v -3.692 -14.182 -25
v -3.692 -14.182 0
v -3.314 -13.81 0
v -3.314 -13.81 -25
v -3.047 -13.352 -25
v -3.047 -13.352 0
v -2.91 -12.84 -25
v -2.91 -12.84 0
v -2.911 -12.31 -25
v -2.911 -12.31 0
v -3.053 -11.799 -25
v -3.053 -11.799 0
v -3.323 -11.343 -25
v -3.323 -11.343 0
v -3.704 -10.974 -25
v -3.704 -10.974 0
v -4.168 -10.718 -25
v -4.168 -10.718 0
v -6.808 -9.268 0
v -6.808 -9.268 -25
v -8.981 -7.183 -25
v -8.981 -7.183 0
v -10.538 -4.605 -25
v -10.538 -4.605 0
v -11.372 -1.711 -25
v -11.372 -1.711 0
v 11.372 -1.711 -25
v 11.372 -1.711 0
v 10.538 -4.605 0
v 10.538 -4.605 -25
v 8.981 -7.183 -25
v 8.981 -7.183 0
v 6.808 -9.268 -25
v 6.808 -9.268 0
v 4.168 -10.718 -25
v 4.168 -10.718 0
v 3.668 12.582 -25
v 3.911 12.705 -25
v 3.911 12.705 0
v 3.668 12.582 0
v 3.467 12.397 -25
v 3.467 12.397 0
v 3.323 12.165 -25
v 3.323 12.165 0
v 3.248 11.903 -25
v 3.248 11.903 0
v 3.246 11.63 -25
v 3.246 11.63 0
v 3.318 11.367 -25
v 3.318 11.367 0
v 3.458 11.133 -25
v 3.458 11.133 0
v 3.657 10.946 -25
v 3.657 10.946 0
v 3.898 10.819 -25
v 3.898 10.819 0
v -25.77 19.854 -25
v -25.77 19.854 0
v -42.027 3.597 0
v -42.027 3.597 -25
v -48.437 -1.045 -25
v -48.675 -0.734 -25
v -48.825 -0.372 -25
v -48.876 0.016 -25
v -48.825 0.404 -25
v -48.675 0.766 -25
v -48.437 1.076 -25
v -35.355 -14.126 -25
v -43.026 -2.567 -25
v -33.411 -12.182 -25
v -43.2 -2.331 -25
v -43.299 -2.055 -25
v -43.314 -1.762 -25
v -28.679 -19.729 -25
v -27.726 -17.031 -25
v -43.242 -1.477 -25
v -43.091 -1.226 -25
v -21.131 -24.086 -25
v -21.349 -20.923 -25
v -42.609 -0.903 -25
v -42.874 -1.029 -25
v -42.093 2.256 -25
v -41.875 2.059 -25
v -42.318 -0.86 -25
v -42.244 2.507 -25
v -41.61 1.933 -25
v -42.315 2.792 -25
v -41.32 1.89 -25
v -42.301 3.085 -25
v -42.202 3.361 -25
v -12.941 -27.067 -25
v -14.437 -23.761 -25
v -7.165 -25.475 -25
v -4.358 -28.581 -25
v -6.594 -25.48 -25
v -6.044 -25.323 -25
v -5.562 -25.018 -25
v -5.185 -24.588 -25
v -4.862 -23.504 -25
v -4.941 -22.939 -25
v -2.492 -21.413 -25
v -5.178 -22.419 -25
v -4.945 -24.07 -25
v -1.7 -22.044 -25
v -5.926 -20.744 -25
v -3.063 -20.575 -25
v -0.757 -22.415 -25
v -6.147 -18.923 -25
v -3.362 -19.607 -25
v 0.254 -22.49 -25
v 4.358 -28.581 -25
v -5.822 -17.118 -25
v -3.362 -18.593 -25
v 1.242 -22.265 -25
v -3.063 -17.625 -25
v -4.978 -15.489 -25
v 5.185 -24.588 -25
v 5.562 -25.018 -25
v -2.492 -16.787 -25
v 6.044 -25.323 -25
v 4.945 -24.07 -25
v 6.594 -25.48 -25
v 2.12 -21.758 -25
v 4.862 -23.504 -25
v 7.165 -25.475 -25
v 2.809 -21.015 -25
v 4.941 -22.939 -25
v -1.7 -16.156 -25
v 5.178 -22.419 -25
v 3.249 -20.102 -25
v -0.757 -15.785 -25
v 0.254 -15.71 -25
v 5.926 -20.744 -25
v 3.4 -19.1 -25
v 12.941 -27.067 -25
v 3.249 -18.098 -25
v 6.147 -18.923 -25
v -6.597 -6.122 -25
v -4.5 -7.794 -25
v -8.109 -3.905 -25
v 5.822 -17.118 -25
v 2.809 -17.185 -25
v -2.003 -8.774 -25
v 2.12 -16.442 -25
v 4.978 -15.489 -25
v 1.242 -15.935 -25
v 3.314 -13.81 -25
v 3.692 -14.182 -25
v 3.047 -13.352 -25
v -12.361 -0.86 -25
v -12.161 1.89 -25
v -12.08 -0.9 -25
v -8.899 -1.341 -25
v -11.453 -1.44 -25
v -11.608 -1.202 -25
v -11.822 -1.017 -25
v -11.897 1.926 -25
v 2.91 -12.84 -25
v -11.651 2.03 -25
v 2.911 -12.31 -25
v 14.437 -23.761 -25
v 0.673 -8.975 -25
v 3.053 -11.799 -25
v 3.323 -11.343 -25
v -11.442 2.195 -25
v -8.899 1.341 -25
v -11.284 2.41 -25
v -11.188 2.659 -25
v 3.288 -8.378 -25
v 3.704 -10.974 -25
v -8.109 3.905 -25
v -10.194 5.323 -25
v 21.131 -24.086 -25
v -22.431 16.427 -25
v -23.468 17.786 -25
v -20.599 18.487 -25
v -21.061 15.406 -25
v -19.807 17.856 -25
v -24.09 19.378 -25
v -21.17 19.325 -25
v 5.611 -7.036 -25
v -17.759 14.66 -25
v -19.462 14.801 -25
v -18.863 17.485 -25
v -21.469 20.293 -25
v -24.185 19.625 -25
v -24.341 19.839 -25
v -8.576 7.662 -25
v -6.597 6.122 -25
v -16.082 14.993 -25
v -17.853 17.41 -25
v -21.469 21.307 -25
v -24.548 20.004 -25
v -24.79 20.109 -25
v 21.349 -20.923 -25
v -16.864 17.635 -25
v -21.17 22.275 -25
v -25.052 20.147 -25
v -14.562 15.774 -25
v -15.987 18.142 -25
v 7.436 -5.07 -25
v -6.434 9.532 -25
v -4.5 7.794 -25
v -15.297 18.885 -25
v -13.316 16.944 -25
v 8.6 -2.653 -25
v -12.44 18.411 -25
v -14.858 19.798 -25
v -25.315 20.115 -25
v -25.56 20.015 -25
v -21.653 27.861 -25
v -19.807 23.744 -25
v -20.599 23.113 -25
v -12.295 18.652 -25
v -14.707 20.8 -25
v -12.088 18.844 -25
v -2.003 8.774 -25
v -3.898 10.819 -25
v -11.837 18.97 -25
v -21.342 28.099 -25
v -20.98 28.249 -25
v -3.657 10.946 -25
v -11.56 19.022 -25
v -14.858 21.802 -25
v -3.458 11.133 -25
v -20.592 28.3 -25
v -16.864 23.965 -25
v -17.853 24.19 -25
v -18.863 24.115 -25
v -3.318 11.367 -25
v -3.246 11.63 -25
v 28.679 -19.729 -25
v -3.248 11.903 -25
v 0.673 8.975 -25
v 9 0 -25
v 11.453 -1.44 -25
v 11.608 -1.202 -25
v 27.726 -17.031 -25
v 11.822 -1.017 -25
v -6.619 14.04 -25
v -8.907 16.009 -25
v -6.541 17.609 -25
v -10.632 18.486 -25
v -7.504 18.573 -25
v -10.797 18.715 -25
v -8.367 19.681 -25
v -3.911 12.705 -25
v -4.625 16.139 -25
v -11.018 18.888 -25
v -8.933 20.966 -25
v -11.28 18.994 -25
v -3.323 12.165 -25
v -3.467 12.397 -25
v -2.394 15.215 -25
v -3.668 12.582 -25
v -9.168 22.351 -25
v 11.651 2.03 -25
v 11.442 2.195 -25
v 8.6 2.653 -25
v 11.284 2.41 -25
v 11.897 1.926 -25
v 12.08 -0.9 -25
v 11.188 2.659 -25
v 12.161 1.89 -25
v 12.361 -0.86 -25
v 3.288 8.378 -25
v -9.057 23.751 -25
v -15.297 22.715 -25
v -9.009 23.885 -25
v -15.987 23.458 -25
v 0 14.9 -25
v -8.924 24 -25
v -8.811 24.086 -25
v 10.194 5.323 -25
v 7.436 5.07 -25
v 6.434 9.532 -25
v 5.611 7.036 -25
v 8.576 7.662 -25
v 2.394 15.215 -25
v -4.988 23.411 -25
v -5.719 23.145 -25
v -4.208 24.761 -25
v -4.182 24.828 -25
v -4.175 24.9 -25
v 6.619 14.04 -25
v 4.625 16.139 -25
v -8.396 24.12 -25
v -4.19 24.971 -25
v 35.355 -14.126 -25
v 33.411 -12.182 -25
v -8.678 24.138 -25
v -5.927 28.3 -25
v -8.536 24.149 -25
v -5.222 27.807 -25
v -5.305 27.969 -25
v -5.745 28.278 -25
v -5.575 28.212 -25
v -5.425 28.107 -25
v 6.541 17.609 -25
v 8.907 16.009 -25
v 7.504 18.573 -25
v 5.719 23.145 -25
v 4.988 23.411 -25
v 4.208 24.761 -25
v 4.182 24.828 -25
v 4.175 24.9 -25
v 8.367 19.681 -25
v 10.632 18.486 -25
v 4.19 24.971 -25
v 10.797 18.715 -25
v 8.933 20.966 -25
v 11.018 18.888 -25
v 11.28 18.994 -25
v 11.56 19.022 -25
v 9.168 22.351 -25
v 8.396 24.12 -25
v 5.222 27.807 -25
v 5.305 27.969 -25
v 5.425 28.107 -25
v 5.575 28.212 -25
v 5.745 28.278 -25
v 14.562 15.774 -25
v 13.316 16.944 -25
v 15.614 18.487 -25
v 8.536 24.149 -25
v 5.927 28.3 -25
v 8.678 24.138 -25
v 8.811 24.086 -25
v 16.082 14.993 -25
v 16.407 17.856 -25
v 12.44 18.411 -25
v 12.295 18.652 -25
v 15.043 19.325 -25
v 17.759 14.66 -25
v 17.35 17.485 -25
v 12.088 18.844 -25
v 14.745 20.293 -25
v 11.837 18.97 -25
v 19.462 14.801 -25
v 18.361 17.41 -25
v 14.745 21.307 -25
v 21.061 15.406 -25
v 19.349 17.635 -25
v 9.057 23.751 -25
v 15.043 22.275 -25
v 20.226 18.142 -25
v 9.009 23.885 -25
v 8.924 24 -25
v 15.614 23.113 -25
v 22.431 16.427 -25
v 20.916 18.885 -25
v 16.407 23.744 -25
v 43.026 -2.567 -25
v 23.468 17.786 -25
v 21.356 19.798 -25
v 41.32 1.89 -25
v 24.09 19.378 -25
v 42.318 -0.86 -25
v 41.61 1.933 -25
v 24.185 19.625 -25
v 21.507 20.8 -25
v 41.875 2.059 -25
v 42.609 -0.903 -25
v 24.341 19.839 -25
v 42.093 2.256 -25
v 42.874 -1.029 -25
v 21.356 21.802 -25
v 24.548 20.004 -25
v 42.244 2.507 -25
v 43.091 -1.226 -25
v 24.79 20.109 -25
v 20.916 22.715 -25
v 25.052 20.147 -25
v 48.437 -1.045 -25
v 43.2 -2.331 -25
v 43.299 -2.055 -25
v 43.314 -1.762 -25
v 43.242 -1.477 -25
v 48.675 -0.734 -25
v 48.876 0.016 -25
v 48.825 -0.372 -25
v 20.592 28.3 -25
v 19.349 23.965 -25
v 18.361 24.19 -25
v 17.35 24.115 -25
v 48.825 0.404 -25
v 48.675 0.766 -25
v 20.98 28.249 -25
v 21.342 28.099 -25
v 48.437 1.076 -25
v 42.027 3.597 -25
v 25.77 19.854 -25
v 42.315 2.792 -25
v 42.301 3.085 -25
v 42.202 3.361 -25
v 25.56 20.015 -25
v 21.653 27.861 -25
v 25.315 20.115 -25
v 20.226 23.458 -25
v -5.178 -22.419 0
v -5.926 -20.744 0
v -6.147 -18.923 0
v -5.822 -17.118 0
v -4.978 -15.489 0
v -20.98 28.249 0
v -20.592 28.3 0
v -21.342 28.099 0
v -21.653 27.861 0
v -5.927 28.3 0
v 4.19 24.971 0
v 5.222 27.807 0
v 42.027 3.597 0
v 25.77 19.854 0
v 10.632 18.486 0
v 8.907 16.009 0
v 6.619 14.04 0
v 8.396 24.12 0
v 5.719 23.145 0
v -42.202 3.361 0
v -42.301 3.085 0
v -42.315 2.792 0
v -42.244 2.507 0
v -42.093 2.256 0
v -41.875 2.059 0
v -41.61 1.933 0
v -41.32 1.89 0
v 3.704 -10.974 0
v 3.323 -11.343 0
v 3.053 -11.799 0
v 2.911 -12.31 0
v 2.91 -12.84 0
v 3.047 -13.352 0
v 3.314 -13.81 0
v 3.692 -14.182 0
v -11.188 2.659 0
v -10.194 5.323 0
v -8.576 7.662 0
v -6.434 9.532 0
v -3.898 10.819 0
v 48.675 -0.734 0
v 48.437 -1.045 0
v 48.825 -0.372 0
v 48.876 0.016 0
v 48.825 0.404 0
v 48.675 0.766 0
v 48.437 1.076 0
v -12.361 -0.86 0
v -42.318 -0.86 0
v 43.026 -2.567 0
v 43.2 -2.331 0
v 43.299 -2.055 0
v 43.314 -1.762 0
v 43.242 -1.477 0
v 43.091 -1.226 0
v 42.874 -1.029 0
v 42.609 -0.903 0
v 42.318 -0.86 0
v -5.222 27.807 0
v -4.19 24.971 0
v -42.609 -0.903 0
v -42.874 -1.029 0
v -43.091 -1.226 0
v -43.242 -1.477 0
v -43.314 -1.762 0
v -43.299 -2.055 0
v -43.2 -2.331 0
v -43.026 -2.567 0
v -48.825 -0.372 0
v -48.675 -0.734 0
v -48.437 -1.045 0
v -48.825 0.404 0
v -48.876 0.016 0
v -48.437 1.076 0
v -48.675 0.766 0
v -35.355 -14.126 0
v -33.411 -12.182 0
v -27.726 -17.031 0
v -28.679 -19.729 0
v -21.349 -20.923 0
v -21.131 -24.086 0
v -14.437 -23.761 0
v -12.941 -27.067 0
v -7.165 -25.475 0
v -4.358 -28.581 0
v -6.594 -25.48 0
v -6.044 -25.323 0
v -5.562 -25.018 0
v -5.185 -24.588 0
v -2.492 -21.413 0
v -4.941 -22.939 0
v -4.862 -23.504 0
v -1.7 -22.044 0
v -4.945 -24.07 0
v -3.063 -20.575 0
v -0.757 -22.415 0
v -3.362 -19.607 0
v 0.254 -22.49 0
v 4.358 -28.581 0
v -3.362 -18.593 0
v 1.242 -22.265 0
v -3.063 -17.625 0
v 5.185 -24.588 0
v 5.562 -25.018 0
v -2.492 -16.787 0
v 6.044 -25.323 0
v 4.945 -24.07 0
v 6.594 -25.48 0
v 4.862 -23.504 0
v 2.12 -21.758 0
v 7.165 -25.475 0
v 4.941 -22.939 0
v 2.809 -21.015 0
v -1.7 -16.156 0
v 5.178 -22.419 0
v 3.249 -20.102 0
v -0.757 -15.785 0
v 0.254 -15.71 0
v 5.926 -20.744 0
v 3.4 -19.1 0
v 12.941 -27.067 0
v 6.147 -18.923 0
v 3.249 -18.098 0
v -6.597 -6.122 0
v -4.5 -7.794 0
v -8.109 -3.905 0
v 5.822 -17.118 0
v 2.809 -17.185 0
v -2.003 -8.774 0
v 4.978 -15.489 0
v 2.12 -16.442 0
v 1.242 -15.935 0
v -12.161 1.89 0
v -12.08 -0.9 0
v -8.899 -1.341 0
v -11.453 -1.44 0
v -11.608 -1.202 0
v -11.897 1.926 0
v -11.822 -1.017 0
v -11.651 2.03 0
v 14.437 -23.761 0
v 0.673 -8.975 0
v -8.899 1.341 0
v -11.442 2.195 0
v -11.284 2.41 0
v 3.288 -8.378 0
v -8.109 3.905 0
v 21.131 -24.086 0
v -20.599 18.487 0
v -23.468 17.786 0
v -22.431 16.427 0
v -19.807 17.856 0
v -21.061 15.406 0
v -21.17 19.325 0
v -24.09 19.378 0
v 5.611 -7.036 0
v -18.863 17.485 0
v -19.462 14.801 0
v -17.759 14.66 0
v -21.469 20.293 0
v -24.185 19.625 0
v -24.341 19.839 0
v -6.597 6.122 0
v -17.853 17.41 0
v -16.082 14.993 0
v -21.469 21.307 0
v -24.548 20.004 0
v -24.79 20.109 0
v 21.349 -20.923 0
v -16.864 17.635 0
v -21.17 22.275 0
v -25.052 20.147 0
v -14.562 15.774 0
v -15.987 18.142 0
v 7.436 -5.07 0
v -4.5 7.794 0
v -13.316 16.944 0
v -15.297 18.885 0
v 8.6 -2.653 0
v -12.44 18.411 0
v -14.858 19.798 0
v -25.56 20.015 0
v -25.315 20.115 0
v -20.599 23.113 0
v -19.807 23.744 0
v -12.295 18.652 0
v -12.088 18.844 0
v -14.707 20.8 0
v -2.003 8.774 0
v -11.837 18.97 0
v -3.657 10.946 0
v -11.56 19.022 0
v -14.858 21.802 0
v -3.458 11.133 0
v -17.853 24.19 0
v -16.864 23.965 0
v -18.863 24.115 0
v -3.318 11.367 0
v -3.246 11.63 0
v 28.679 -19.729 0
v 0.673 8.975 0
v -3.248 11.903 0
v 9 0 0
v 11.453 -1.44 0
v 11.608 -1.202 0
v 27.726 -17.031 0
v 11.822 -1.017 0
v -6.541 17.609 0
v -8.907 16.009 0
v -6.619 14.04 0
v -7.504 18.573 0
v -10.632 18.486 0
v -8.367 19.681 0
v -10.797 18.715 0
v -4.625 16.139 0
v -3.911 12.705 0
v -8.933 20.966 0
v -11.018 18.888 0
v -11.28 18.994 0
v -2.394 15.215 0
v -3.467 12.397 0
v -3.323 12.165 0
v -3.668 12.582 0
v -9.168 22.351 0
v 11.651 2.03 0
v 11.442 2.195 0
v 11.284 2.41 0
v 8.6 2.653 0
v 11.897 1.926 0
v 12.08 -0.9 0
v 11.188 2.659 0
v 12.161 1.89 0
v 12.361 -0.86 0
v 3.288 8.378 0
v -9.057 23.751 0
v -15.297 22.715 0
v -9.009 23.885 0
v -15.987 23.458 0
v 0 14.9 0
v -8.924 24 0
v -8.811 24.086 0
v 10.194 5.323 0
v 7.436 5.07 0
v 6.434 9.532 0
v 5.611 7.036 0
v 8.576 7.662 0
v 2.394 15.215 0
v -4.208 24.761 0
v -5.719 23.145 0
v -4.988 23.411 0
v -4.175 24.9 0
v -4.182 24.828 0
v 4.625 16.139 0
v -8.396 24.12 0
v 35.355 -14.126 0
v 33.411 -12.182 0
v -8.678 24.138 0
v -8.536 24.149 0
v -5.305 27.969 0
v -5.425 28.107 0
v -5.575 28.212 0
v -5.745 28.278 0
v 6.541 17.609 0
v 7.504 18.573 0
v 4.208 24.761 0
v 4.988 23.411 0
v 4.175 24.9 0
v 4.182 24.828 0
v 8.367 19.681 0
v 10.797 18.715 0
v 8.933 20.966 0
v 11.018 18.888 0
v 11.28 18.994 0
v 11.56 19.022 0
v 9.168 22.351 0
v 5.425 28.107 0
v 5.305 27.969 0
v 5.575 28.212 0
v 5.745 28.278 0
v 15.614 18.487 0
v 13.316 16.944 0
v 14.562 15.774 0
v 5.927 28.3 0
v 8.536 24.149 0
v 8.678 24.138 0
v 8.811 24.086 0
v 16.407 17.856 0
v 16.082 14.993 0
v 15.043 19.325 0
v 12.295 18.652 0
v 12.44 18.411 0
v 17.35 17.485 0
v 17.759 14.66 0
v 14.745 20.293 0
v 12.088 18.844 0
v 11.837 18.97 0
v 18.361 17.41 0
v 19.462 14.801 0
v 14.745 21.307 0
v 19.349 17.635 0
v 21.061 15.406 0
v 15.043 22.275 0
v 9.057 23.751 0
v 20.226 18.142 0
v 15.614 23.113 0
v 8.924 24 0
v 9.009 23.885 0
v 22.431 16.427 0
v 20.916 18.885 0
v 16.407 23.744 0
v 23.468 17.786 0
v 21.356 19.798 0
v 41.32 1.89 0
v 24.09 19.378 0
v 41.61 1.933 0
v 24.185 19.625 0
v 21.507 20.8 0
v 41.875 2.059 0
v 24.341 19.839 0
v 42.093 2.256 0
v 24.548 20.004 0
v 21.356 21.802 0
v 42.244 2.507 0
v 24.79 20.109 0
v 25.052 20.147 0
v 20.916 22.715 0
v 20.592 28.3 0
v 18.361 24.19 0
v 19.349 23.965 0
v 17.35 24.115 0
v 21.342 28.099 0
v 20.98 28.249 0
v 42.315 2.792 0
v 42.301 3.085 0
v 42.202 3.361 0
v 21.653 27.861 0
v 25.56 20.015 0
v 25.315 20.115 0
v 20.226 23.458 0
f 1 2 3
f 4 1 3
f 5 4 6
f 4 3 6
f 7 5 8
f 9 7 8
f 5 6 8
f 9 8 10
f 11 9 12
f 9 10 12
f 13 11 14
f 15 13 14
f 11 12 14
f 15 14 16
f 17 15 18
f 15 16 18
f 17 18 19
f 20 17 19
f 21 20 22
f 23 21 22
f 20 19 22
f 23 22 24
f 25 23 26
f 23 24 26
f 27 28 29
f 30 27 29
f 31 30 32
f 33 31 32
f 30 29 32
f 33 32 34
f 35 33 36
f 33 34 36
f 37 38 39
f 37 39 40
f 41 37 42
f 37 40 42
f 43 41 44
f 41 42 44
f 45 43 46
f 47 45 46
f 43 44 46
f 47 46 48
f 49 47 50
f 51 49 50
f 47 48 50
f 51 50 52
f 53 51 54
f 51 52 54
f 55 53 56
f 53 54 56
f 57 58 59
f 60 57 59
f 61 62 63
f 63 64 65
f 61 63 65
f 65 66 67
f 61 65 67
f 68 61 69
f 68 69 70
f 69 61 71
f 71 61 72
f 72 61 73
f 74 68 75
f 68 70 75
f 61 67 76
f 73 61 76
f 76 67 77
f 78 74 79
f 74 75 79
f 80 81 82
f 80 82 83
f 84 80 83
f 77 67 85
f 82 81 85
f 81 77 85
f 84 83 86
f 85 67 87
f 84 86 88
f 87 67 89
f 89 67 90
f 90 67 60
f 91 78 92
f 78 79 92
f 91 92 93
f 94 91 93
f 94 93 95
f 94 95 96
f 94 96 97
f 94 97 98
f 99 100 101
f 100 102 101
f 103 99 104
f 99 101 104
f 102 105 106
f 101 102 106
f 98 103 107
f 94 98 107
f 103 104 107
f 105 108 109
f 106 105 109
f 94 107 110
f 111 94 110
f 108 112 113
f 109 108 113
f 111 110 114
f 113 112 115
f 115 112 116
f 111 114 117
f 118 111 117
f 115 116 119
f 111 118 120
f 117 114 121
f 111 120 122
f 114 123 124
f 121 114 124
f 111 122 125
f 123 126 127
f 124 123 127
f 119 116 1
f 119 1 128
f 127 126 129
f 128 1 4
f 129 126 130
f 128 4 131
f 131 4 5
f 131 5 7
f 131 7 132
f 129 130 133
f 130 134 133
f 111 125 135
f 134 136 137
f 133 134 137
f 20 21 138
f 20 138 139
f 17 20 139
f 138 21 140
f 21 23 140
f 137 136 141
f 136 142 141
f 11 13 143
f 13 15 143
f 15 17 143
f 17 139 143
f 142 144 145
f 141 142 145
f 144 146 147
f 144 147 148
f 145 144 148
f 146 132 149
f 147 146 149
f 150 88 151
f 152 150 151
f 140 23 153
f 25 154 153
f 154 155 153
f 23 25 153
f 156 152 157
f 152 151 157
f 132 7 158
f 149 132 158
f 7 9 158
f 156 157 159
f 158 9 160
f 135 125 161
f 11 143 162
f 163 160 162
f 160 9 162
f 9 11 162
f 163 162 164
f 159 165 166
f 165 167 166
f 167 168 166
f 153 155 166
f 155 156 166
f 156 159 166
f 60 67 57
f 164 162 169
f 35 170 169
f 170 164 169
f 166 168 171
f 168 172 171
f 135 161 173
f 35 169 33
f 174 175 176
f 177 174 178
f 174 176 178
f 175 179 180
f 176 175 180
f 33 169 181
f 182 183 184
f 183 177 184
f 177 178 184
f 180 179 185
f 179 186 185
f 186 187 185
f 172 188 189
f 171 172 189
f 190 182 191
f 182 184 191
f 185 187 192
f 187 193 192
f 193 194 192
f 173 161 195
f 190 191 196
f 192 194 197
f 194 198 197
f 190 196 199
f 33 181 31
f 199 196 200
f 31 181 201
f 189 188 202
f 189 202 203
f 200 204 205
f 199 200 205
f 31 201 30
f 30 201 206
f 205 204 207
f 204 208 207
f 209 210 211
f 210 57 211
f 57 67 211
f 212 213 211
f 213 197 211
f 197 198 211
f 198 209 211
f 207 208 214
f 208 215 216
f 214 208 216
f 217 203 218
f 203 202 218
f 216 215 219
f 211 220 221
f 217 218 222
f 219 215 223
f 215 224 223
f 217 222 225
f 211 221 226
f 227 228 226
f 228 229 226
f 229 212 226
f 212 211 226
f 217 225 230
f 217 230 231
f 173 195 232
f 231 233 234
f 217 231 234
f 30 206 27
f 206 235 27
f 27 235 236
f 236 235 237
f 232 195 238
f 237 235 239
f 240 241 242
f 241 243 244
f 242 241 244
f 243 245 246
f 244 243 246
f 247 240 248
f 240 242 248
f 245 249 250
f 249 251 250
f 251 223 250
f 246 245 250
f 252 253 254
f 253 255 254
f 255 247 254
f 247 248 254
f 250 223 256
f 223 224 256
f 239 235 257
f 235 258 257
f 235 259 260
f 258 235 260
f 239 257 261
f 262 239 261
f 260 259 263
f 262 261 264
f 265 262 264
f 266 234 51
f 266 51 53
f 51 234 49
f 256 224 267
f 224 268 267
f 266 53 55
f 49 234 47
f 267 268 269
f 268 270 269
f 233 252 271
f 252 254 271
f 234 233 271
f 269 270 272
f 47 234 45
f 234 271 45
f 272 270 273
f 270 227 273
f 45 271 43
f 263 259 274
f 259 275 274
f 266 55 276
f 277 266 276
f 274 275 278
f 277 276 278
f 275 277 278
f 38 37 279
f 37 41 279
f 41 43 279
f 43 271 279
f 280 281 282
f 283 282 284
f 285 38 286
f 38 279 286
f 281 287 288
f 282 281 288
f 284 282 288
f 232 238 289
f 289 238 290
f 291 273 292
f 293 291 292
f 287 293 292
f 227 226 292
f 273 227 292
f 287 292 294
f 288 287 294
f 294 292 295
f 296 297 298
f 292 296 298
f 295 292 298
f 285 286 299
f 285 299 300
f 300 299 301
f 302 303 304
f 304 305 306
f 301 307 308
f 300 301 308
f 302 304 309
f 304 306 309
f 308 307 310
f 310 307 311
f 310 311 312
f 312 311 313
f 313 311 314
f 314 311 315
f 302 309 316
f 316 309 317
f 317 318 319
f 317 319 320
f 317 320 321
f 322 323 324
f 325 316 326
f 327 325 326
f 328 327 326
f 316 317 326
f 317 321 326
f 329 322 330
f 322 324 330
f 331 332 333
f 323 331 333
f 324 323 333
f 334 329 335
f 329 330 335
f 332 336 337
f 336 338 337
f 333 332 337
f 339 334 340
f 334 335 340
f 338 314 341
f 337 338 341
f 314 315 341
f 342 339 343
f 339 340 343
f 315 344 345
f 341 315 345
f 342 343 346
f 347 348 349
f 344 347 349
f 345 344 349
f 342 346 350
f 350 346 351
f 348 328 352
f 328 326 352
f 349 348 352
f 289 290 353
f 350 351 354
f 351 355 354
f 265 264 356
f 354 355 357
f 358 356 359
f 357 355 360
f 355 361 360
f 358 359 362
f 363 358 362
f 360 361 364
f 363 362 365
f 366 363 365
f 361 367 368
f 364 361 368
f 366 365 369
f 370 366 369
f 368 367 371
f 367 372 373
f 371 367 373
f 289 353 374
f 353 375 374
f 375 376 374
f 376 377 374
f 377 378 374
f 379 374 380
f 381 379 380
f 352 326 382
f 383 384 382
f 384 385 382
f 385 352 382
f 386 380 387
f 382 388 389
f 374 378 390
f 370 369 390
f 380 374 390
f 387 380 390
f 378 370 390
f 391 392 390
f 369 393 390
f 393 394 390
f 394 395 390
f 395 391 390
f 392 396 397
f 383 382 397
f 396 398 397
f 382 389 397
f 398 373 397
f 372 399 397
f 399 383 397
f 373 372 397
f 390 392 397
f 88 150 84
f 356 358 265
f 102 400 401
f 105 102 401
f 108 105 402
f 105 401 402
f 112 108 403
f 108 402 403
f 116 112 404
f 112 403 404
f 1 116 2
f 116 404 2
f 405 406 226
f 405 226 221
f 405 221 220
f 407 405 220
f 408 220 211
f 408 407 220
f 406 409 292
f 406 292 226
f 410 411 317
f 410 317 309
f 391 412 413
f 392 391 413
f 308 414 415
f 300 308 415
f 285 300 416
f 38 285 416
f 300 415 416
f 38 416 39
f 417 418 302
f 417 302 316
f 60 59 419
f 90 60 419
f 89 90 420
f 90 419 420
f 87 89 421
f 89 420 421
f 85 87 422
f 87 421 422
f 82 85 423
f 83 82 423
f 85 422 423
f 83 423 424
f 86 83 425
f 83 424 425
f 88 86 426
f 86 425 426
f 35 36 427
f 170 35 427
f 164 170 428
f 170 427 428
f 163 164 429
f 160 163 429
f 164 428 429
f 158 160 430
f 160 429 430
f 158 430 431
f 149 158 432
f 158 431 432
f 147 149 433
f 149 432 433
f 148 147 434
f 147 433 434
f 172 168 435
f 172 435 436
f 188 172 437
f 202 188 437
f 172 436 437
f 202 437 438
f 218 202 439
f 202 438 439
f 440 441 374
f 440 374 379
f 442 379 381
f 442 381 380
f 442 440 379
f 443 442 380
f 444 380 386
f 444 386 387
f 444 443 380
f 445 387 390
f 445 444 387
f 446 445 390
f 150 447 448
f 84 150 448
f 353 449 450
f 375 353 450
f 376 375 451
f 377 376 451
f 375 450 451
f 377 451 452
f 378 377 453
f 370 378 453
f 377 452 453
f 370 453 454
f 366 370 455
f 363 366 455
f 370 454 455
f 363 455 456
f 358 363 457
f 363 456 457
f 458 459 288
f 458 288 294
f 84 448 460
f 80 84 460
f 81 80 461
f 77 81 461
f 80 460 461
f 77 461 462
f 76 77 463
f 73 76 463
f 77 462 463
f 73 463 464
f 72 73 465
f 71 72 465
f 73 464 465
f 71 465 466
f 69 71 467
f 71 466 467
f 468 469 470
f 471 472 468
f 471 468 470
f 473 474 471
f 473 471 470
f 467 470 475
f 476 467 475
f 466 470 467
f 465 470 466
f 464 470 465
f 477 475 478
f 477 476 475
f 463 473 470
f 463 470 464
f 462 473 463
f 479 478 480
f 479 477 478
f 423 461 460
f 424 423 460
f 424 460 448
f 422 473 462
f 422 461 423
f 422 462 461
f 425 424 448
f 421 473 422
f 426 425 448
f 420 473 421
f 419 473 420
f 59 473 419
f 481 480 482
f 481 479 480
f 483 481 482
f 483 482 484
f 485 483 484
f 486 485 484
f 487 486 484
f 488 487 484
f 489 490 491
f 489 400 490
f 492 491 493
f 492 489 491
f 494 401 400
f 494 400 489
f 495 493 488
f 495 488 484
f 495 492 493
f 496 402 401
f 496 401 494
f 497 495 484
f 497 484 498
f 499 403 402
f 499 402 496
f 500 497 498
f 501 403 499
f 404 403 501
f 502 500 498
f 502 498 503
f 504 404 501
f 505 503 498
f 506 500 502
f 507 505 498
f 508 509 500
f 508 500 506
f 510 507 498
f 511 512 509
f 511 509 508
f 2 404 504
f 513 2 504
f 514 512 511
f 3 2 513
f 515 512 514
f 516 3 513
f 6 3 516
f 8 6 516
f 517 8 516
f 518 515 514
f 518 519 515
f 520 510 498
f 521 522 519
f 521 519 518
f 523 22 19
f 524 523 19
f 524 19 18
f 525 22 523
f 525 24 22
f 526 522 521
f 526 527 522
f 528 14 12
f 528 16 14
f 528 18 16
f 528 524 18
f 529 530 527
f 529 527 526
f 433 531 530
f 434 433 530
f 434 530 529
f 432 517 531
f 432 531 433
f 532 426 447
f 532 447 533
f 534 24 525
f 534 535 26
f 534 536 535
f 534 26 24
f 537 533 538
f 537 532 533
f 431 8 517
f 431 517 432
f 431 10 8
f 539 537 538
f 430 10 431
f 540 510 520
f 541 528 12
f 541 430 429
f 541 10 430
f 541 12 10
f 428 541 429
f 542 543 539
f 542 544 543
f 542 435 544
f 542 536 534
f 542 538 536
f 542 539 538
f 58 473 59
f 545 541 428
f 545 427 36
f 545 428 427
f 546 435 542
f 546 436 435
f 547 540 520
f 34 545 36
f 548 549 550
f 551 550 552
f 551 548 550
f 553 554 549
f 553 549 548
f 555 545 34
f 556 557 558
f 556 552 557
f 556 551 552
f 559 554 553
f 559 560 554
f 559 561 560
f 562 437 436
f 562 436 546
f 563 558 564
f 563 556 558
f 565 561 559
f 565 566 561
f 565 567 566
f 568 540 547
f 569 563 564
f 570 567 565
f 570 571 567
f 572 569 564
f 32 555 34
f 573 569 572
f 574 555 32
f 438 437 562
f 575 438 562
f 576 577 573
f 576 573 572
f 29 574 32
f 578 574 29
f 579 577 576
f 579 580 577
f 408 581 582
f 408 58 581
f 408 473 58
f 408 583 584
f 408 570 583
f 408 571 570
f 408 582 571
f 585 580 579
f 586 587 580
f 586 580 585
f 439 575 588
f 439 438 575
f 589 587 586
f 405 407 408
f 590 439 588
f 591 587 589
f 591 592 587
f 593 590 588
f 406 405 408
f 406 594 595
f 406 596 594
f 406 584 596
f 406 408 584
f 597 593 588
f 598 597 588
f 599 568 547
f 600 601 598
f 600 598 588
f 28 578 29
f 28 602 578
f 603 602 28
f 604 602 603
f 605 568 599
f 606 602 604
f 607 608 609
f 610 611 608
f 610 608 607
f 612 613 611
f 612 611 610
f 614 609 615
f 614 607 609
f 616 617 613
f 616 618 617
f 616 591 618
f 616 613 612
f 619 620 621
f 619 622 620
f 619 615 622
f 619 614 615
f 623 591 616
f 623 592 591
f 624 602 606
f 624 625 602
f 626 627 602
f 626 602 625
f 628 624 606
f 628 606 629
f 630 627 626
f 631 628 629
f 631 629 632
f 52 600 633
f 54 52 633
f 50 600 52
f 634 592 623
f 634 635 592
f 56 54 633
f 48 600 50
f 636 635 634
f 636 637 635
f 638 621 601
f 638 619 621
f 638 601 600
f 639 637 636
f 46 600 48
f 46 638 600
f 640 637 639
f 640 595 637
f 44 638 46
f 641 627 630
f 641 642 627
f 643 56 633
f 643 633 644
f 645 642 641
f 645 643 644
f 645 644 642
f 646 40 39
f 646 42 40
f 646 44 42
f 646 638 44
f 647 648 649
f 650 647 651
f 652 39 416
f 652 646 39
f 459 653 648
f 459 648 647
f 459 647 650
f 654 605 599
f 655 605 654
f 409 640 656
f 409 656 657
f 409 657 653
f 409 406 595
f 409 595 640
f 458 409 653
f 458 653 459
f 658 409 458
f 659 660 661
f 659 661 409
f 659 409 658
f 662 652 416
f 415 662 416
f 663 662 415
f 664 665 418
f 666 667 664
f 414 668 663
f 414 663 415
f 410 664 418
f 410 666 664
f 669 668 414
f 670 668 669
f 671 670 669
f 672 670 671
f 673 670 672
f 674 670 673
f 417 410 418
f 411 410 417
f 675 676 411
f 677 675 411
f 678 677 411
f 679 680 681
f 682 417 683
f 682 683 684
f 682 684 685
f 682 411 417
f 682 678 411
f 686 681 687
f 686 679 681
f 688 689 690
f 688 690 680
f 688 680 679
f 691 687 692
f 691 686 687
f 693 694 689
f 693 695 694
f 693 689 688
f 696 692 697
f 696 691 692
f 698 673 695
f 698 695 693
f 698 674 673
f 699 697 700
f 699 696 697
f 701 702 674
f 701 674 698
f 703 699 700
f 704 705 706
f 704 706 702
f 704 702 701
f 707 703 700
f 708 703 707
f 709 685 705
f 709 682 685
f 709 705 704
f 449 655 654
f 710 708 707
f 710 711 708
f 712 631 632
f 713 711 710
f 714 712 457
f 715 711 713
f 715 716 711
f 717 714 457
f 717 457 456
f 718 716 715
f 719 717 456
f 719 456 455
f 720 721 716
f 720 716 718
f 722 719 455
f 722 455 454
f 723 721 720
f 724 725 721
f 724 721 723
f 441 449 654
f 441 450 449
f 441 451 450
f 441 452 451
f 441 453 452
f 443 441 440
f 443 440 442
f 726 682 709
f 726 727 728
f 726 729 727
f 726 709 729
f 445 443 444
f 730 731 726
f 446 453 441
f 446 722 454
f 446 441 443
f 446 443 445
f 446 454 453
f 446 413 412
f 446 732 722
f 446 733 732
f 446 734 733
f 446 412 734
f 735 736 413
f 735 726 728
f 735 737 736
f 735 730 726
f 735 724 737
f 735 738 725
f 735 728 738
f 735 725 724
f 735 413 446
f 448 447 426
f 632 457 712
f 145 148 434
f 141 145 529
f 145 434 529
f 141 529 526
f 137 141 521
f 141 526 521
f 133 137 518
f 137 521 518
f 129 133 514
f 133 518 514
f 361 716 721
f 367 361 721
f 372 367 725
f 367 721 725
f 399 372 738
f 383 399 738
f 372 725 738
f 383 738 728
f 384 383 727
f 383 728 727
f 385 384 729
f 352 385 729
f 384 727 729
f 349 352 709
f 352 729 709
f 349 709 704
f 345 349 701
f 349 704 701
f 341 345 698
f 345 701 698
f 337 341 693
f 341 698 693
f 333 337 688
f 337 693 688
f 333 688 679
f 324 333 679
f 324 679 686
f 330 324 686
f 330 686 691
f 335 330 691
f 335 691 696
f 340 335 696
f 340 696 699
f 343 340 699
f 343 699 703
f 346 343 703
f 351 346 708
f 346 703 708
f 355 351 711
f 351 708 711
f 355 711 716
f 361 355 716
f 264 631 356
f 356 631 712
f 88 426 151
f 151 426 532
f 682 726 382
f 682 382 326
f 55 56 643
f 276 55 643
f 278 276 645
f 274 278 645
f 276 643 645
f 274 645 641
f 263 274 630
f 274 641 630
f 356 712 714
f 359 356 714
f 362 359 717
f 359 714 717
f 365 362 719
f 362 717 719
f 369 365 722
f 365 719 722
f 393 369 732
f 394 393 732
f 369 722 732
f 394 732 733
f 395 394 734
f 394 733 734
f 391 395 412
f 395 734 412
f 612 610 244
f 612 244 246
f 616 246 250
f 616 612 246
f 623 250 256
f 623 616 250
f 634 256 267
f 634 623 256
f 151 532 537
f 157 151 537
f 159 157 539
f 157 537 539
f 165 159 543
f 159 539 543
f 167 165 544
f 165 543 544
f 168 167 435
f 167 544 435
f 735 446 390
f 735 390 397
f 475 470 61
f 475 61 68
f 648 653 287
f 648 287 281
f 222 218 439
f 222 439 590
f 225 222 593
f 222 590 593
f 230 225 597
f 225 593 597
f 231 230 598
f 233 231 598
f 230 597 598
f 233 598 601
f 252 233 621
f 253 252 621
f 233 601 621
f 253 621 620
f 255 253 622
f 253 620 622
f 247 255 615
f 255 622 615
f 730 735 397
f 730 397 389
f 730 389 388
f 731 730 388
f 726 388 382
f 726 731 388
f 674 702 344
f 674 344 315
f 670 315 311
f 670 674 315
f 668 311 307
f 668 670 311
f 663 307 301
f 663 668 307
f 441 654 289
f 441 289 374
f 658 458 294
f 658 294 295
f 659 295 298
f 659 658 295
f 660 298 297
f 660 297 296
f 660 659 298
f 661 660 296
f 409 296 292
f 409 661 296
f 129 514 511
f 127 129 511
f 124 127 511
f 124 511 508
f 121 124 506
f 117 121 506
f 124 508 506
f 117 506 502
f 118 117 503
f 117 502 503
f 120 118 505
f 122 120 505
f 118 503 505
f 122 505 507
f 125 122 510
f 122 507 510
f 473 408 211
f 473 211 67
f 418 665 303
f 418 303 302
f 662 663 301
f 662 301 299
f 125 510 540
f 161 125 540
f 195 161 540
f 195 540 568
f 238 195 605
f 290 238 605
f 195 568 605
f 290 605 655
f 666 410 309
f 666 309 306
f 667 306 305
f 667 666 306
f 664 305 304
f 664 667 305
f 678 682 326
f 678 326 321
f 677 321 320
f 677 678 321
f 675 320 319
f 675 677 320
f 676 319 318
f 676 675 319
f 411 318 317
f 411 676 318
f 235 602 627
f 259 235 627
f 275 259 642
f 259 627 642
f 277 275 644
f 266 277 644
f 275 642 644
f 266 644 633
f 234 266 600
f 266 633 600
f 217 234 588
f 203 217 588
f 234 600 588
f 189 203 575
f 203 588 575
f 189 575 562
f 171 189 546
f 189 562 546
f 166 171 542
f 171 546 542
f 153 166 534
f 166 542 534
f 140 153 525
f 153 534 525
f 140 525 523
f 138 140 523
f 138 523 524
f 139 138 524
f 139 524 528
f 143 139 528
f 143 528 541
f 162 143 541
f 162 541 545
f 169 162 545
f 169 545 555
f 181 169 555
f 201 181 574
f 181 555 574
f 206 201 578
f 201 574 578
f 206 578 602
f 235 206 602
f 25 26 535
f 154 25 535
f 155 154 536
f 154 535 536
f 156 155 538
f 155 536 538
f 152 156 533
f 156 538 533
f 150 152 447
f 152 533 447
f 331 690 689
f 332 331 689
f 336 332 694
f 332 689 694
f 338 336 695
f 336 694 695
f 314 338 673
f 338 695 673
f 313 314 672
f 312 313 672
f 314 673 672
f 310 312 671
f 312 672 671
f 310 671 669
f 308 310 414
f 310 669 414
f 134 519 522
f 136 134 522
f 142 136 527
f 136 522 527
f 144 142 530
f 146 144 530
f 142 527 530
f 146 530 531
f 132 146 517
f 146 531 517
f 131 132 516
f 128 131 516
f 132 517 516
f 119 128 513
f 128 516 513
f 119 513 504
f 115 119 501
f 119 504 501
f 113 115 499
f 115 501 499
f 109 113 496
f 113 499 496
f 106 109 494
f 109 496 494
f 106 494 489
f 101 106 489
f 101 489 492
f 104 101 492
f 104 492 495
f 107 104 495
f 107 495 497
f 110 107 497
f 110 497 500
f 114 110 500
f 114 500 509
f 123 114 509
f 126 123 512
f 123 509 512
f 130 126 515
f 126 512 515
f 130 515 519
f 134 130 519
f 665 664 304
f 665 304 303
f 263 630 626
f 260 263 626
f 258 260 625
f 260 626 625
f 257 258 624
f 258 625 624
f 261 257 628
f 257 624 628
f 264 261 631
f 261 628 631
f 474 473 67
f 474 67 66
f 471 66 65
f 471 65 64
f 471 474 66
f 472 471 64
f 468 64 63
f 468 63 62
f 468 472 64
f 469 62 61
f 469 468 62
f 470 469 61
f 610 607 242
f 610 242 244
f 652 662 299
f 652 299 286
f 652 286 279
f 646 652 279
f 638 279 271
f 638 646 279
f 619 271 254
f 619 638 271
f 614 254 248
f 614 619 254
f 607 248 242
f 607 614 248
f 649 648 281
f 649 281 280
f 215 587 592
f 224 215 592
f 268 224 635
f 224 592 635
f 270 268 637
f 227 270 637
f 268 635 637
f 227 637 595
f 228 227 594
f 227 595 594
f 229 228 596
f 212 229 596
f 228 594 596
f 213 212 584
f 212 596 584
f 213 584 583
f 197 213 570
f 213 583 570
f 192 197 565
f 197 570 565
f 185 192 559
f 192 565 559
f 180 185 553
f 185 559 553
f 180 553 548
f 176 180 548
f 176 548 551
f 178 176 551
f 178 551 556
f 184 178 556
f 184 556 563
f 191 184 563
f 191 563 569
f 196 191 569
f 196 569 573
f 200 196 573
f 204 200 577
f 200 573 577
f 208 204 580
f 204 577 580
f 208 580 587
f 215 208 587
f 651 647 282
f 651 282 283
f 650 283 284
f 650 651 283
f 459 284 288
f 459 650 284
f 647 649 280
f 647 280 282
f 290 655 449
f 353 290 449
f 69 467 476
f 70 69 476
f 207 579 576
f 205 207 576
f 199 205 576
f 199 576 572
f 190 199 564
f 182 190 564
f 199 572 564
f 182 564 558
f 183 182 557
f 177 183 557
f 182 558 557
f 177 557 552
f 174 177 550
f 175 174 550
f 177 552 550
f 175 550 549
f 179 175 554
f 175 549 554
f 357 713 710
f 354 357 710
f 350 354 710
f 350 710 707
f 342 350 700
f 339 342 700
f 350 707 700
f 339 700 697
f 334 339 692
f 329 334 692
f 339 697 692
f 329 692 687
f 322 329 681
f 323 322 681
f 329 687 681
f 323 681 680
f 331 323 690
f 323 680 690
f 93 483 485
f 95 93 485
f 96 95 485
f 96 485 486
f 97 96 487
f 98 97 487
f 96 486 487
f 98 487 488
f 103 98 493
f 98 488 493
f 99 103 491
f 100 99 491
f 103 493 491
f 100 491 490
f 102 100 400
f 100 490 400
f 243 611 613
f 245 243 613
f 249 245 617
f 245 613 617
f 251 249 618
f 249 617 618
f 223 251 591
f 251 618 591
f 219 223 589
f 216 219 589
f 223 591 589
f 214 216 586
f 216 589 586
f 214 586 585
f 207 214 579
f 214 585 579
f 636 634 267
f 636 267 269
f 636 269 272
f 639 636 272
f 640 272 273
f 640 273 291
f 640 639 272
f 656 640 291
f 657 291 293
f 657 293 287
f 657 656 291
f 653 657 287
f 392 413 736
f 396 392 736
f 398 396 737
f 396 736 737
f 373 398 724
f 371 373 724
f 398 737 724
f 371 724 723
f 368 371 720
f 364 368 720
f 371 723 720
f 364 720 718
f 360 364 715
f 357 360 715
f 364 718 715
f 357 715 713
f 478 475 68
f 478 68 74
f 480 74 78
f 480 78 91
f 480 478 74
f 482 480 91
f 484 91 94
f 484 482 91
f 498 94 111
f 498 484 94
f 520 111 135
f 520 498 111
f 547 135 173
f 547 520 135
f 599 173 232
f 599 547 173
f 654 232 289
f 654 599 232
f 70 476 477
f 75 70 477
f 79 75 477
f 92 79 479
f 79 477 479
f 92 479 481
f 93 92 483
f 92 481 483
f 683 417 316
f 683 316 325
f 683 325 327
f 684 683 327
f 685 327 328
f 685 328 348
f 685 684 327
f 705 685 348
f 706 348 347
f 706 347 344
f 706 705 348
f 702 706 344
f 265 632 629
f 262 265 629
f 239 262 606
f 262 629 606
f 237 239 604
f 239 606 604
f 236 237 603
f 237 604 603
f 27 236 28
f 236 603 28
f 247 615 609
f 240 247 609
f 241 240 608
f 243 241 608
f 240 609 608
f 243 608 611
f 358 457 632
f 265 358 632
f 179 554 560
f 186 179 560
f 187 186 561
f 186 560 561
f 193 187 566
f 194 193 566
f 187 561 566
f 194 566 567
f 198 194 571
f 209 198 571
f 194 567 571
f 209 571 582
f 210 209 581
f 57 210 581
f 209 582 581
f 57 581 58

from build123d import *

# Parameters (mm, degrees)
SK_MAIN_EXTRUSION_R   = 3.4
SK_MAIN_EXTRUSION_R_2 = 9
MAIN_EXTRUSION_DEPTH  = 25


with BuildPart() as part:
    # Sk Main Extrusion → Main Extrusion (new body)
    with BuildSketch(Plane.XY):
        with BuildLine():
            Line((5.222054351, 27.806515107), (4.190076845, 24.971180212))
            ThreePointArc((4.190076845, 24.971180212), (4.175951325, 24.863886241), (4.208493649, 24.760675177))
            Line((4.208493649, 24.760675177), (4.987558066, 23.411296024))
            Line((4.987558066, 23.411296024), (5.718509166, 23.145251581))
            Line((5.718509166, 23.145251581), (8.396186179, 24.11984631))
            ThreePointArc((8.396186179, 24.11984631), (8.811074612, 24.086489799), (9.056960151, 23.750654467))
            ThreePointArc((9.056960151, 23.750654467), (8.933433013, 20.965882372), (7.504160339, 18.572684887))
            Line((7.504160339, 18.572684887), (6.540737726, 17.609262274))
            ThreePointArc((6.540737726, 17.609262274), (0, 14.9), (-6.540737726, 17.609262274))
            Line((-6.540737726, 17.609262274), (-7.504160339, 18.572684887))
            ThreePointArc((-7.504160339, 18.572684887), (-8.933433013, 20.965882372), (-9.056960151, 23.750654467))
            ThreePointArc((-9.056960151, 23.750654467), (-8.811074612, 24.086489799), (-8.396186179, 24.11984631))
            Line((-8.396186179, 24.11984631), (-5.718509166, 23.145251581))
            Line((-5.718509166, 23.145251581), (-4.987558066, 23.411296024))
            Line((-4.987558066, 23.411296024), (-4.208493649, 24.760675177))
            ThreePointArc((-4.208493649, 24.760675177), (-4.175951325, 24.863886241), (-4.190076845, 24.971180212))
            Line((-4.190076845, 24.971180212), (-5.222054351, 27.806515107))
            ThreePointArc((-5.222054351, 27.806515107), (-5.496641489, 28.164364033), (-5.926823816, 28.3))
            Line((-5.926823816, 28.3), (-20.591883092, 28.3))
            ThreePointArc((-20.591883092, 28.3), (-21.165908241, 28.185819299), (-21.652543264, 27.860660172))
            Line((-21.652543264, 27.860660172), (-48.436814511, 1.076388924))
            ThreePointArc((-48.436814511, 1.076388924), (-48.876154339, 0.015728753), (-48.436814511, -1.044931419))
            Line((-48.436814511, -1.044931419), (-35.355339059, -14.126406871))
            ThreePointArc((-35.355339059, -14.126406871), (0, -28.771067812), (35.355339059, -14.126406871))
            Line((35.355339059, -14.126406871), (48.436814511, -1.044931419))
            ThreePointArc((48.436814511, -1.044931419), (48.876154339, 0.015728753), (48.436814511, 1.076388924))
            Line((48.436814511, 1.076388924), (21.652543264, 27.860660172))
            ThreePointArc((21.652543264, 27.860660172), (21.165908241, 28.185819299), (20.591883092, 28.3))
            Line((20.591883092, 28.3), (5.926823816, 28.3))
            ThreePointArc((5.926823816, 28.3), (5.496641489, 28.164364033), (5.222054351, 27.806515107))
        make_face()
        with Locations((-18.106601718, 20.8)):
            Circle(SK_MAIN_EXTRUSION_R, mode=Mode.SUBTRACT)
        with Locations((18.106601718, 20.8)):
            Circle(SK_MAIN_EXTRUSION_R, mode=Mode.SUBTRACT)
        Circle(SK_MAIN_EXTRUSION_R_2, mode=Mode.SUBTRACT)
        with Locations((0, -19.1)):
            Circle(SK_MAIN_EXTRUSION_R, mode=Mode.SUBTRACT)
        with BuildLine():
            Line((33.410795411, -12.181863223), (43.025551853, -2.567106781))
            ThreePointArc((43.025551853, -2.567106781), (43.242324604, -1.477316568), (42.318445072, -0.86))
            Line((42.318445072, -0.86), (12.360841395, -0.86))
            ThreePointArc((12.360841395, -0.86), (11.708461138, -1.102108187), (11.371974084, -1.7112))
            ThreePointArc((11.371974084, -1.7112), (8.980737669, -7.183059997), (4.167977698, -10.718113729))
            ThreePointArc((4.167977698, -10.718113729), (2.911454942, -12.309920658), (3.692145622, -14.181609948))
            ThreePointArc((3.692145622, -14.181609948), (6.052344462, -18.008383533), (5.177787873, -22.418585955))
            ThreePointArc((5.177787873, -22.418585955), (5.184897798, -24.588029411), (7.164897408, -25.474673081))
            ThreePointArc((7.164897408, -25.474673081), (21.348803489, -20.923067641), (33.410795411, -12.181863223))
        make_face(mode=Mode.SUBTRACT)
        with BuildLine():
            Line((-12.360841395, -0.86), (-42.318445072, -0.86))
            ThreePointArc((-42.318445072, -0.86), (-43.242324604, -1.477316568), (-43.025551853, -2.567106781))
            Line((-43.025551853, -2.567106781), (-33.410795411, -12.181863223))
            ThreePointArc((-33.410795411, -12.181863223), (-21.348803489, -20.923067641), (-7.164897408, -25.474673081))
            ThreePointArc((-7.164897408, -25.474673081), (-5.184897798, -24.588029411), (-5.177787873, -22.418585955))
            ThreePointArc((-5.177787873, -22.418585955), (-6.052344462, -18.008383533), (-3.692145622, -14.181609948))
            ThreePointArc((-3.692145622, -14.181609948), (-2.911454942, -12.309920658), (-4.167977698, -10.718113729))
            ThreePointArc((-4.167977698, -10.718113729), (-8.980737669, -7.183059997), (-11.371974084, -1.7112))
            ThreePointArc((-11.371974084, -1.7112), (-11.708461138, -1.102108187), (-12.360841395, -0.86))
        make_face(mode=Mode.SUBTRACT)
        with BuildLine():
            Line((42.027009358, 3.597106781), (25.770007578, 19.854108561))
            ThreePointArc((25.770007578, 19.854108561), (24.790343945, 20.109141459), (24.089991835, 19.378190342))
            ThreePointArc((24.089991835, 19.378190342), (18.61547326, 14.671089024), (12.43962541, 18.410883107))
            ThreePointArc((12.43962541, 18.410883107), (11.559727537, 19.021544755), (10.632153091, 18.486069675))
            ThreePointArc((10.632153091, 18.486069675), (7.825100476, 14.952318837), (3.911288507, 12.705317448))
            ThreePointArc((3.911288507, 12.705317448), (3.237253104, 11.76683924), (3.898250879, 10.819133056))
            ThreePointArc((3.898250879, 10.819133056), (8.576111128, 7.661613271), (11.188421808, 2.6588))
            ThreePointArc((11.188421808, 2.6588), (11.541328052, 2.10539819), (12.161328052, 1.89))
            Line((12.161328052, 1.89), (41.319902577, 1.89))
            ThreePointArc((41.319902577, 1.89), (42.243782109, 2.507316568), (42.027009358, 3.597106781))
        make_face(mode=Mode.SUBTRACT)
        with BuildLine():
            Line((-25.770007578, 19.854108561), (-42.027009358, 3.597106781))
            ThreePointArc((-42.027009358, 3.597106781), (-42.243782109, 2.507316568), (-41.319902577, 1.89))
            Line((-41.319902577, 1.89), (-12.161328052, 1.89))
            ThreePointArc((-12.161328052, 1.89), (-11.541328052, 2.10539819), (-11.188421808, 2.6588))
            ThreePointArc((-11.188421808, 2.6588), (-8.576111128, 7.661613271), (-3.898250879, 10.819133056))
            ThreePointArc((-3.898250879, 10.819133056), (-3.237253104, 11.76683924), (-3.911288507, 12.705317448))
            ThreePointArc((-3.911288507, 12.705317448), (-7.825100476, 14.952318837), (-10.632153091, 18.486069675))
            ThreePointArc((-10.632153091, 18.486069675), (-11.559727537, 19.021544755), (-12.43962541, 18.410883107))
            ThreePointArc((-12.43962541, 18.410883107), (-18.61547326, 14.671089024), (-24.089991835, 19.378190342))
            ThreePointArc((-24.089991835, 19.378190342), (-24.790343945, 20.109141459), (-25.770007578, 19.854108561))
        make_face(mode=Mode.SUBTRACT)
    extrude(amount=-MAIN_EXTRUSION_DEPTH)


solid = part.part
